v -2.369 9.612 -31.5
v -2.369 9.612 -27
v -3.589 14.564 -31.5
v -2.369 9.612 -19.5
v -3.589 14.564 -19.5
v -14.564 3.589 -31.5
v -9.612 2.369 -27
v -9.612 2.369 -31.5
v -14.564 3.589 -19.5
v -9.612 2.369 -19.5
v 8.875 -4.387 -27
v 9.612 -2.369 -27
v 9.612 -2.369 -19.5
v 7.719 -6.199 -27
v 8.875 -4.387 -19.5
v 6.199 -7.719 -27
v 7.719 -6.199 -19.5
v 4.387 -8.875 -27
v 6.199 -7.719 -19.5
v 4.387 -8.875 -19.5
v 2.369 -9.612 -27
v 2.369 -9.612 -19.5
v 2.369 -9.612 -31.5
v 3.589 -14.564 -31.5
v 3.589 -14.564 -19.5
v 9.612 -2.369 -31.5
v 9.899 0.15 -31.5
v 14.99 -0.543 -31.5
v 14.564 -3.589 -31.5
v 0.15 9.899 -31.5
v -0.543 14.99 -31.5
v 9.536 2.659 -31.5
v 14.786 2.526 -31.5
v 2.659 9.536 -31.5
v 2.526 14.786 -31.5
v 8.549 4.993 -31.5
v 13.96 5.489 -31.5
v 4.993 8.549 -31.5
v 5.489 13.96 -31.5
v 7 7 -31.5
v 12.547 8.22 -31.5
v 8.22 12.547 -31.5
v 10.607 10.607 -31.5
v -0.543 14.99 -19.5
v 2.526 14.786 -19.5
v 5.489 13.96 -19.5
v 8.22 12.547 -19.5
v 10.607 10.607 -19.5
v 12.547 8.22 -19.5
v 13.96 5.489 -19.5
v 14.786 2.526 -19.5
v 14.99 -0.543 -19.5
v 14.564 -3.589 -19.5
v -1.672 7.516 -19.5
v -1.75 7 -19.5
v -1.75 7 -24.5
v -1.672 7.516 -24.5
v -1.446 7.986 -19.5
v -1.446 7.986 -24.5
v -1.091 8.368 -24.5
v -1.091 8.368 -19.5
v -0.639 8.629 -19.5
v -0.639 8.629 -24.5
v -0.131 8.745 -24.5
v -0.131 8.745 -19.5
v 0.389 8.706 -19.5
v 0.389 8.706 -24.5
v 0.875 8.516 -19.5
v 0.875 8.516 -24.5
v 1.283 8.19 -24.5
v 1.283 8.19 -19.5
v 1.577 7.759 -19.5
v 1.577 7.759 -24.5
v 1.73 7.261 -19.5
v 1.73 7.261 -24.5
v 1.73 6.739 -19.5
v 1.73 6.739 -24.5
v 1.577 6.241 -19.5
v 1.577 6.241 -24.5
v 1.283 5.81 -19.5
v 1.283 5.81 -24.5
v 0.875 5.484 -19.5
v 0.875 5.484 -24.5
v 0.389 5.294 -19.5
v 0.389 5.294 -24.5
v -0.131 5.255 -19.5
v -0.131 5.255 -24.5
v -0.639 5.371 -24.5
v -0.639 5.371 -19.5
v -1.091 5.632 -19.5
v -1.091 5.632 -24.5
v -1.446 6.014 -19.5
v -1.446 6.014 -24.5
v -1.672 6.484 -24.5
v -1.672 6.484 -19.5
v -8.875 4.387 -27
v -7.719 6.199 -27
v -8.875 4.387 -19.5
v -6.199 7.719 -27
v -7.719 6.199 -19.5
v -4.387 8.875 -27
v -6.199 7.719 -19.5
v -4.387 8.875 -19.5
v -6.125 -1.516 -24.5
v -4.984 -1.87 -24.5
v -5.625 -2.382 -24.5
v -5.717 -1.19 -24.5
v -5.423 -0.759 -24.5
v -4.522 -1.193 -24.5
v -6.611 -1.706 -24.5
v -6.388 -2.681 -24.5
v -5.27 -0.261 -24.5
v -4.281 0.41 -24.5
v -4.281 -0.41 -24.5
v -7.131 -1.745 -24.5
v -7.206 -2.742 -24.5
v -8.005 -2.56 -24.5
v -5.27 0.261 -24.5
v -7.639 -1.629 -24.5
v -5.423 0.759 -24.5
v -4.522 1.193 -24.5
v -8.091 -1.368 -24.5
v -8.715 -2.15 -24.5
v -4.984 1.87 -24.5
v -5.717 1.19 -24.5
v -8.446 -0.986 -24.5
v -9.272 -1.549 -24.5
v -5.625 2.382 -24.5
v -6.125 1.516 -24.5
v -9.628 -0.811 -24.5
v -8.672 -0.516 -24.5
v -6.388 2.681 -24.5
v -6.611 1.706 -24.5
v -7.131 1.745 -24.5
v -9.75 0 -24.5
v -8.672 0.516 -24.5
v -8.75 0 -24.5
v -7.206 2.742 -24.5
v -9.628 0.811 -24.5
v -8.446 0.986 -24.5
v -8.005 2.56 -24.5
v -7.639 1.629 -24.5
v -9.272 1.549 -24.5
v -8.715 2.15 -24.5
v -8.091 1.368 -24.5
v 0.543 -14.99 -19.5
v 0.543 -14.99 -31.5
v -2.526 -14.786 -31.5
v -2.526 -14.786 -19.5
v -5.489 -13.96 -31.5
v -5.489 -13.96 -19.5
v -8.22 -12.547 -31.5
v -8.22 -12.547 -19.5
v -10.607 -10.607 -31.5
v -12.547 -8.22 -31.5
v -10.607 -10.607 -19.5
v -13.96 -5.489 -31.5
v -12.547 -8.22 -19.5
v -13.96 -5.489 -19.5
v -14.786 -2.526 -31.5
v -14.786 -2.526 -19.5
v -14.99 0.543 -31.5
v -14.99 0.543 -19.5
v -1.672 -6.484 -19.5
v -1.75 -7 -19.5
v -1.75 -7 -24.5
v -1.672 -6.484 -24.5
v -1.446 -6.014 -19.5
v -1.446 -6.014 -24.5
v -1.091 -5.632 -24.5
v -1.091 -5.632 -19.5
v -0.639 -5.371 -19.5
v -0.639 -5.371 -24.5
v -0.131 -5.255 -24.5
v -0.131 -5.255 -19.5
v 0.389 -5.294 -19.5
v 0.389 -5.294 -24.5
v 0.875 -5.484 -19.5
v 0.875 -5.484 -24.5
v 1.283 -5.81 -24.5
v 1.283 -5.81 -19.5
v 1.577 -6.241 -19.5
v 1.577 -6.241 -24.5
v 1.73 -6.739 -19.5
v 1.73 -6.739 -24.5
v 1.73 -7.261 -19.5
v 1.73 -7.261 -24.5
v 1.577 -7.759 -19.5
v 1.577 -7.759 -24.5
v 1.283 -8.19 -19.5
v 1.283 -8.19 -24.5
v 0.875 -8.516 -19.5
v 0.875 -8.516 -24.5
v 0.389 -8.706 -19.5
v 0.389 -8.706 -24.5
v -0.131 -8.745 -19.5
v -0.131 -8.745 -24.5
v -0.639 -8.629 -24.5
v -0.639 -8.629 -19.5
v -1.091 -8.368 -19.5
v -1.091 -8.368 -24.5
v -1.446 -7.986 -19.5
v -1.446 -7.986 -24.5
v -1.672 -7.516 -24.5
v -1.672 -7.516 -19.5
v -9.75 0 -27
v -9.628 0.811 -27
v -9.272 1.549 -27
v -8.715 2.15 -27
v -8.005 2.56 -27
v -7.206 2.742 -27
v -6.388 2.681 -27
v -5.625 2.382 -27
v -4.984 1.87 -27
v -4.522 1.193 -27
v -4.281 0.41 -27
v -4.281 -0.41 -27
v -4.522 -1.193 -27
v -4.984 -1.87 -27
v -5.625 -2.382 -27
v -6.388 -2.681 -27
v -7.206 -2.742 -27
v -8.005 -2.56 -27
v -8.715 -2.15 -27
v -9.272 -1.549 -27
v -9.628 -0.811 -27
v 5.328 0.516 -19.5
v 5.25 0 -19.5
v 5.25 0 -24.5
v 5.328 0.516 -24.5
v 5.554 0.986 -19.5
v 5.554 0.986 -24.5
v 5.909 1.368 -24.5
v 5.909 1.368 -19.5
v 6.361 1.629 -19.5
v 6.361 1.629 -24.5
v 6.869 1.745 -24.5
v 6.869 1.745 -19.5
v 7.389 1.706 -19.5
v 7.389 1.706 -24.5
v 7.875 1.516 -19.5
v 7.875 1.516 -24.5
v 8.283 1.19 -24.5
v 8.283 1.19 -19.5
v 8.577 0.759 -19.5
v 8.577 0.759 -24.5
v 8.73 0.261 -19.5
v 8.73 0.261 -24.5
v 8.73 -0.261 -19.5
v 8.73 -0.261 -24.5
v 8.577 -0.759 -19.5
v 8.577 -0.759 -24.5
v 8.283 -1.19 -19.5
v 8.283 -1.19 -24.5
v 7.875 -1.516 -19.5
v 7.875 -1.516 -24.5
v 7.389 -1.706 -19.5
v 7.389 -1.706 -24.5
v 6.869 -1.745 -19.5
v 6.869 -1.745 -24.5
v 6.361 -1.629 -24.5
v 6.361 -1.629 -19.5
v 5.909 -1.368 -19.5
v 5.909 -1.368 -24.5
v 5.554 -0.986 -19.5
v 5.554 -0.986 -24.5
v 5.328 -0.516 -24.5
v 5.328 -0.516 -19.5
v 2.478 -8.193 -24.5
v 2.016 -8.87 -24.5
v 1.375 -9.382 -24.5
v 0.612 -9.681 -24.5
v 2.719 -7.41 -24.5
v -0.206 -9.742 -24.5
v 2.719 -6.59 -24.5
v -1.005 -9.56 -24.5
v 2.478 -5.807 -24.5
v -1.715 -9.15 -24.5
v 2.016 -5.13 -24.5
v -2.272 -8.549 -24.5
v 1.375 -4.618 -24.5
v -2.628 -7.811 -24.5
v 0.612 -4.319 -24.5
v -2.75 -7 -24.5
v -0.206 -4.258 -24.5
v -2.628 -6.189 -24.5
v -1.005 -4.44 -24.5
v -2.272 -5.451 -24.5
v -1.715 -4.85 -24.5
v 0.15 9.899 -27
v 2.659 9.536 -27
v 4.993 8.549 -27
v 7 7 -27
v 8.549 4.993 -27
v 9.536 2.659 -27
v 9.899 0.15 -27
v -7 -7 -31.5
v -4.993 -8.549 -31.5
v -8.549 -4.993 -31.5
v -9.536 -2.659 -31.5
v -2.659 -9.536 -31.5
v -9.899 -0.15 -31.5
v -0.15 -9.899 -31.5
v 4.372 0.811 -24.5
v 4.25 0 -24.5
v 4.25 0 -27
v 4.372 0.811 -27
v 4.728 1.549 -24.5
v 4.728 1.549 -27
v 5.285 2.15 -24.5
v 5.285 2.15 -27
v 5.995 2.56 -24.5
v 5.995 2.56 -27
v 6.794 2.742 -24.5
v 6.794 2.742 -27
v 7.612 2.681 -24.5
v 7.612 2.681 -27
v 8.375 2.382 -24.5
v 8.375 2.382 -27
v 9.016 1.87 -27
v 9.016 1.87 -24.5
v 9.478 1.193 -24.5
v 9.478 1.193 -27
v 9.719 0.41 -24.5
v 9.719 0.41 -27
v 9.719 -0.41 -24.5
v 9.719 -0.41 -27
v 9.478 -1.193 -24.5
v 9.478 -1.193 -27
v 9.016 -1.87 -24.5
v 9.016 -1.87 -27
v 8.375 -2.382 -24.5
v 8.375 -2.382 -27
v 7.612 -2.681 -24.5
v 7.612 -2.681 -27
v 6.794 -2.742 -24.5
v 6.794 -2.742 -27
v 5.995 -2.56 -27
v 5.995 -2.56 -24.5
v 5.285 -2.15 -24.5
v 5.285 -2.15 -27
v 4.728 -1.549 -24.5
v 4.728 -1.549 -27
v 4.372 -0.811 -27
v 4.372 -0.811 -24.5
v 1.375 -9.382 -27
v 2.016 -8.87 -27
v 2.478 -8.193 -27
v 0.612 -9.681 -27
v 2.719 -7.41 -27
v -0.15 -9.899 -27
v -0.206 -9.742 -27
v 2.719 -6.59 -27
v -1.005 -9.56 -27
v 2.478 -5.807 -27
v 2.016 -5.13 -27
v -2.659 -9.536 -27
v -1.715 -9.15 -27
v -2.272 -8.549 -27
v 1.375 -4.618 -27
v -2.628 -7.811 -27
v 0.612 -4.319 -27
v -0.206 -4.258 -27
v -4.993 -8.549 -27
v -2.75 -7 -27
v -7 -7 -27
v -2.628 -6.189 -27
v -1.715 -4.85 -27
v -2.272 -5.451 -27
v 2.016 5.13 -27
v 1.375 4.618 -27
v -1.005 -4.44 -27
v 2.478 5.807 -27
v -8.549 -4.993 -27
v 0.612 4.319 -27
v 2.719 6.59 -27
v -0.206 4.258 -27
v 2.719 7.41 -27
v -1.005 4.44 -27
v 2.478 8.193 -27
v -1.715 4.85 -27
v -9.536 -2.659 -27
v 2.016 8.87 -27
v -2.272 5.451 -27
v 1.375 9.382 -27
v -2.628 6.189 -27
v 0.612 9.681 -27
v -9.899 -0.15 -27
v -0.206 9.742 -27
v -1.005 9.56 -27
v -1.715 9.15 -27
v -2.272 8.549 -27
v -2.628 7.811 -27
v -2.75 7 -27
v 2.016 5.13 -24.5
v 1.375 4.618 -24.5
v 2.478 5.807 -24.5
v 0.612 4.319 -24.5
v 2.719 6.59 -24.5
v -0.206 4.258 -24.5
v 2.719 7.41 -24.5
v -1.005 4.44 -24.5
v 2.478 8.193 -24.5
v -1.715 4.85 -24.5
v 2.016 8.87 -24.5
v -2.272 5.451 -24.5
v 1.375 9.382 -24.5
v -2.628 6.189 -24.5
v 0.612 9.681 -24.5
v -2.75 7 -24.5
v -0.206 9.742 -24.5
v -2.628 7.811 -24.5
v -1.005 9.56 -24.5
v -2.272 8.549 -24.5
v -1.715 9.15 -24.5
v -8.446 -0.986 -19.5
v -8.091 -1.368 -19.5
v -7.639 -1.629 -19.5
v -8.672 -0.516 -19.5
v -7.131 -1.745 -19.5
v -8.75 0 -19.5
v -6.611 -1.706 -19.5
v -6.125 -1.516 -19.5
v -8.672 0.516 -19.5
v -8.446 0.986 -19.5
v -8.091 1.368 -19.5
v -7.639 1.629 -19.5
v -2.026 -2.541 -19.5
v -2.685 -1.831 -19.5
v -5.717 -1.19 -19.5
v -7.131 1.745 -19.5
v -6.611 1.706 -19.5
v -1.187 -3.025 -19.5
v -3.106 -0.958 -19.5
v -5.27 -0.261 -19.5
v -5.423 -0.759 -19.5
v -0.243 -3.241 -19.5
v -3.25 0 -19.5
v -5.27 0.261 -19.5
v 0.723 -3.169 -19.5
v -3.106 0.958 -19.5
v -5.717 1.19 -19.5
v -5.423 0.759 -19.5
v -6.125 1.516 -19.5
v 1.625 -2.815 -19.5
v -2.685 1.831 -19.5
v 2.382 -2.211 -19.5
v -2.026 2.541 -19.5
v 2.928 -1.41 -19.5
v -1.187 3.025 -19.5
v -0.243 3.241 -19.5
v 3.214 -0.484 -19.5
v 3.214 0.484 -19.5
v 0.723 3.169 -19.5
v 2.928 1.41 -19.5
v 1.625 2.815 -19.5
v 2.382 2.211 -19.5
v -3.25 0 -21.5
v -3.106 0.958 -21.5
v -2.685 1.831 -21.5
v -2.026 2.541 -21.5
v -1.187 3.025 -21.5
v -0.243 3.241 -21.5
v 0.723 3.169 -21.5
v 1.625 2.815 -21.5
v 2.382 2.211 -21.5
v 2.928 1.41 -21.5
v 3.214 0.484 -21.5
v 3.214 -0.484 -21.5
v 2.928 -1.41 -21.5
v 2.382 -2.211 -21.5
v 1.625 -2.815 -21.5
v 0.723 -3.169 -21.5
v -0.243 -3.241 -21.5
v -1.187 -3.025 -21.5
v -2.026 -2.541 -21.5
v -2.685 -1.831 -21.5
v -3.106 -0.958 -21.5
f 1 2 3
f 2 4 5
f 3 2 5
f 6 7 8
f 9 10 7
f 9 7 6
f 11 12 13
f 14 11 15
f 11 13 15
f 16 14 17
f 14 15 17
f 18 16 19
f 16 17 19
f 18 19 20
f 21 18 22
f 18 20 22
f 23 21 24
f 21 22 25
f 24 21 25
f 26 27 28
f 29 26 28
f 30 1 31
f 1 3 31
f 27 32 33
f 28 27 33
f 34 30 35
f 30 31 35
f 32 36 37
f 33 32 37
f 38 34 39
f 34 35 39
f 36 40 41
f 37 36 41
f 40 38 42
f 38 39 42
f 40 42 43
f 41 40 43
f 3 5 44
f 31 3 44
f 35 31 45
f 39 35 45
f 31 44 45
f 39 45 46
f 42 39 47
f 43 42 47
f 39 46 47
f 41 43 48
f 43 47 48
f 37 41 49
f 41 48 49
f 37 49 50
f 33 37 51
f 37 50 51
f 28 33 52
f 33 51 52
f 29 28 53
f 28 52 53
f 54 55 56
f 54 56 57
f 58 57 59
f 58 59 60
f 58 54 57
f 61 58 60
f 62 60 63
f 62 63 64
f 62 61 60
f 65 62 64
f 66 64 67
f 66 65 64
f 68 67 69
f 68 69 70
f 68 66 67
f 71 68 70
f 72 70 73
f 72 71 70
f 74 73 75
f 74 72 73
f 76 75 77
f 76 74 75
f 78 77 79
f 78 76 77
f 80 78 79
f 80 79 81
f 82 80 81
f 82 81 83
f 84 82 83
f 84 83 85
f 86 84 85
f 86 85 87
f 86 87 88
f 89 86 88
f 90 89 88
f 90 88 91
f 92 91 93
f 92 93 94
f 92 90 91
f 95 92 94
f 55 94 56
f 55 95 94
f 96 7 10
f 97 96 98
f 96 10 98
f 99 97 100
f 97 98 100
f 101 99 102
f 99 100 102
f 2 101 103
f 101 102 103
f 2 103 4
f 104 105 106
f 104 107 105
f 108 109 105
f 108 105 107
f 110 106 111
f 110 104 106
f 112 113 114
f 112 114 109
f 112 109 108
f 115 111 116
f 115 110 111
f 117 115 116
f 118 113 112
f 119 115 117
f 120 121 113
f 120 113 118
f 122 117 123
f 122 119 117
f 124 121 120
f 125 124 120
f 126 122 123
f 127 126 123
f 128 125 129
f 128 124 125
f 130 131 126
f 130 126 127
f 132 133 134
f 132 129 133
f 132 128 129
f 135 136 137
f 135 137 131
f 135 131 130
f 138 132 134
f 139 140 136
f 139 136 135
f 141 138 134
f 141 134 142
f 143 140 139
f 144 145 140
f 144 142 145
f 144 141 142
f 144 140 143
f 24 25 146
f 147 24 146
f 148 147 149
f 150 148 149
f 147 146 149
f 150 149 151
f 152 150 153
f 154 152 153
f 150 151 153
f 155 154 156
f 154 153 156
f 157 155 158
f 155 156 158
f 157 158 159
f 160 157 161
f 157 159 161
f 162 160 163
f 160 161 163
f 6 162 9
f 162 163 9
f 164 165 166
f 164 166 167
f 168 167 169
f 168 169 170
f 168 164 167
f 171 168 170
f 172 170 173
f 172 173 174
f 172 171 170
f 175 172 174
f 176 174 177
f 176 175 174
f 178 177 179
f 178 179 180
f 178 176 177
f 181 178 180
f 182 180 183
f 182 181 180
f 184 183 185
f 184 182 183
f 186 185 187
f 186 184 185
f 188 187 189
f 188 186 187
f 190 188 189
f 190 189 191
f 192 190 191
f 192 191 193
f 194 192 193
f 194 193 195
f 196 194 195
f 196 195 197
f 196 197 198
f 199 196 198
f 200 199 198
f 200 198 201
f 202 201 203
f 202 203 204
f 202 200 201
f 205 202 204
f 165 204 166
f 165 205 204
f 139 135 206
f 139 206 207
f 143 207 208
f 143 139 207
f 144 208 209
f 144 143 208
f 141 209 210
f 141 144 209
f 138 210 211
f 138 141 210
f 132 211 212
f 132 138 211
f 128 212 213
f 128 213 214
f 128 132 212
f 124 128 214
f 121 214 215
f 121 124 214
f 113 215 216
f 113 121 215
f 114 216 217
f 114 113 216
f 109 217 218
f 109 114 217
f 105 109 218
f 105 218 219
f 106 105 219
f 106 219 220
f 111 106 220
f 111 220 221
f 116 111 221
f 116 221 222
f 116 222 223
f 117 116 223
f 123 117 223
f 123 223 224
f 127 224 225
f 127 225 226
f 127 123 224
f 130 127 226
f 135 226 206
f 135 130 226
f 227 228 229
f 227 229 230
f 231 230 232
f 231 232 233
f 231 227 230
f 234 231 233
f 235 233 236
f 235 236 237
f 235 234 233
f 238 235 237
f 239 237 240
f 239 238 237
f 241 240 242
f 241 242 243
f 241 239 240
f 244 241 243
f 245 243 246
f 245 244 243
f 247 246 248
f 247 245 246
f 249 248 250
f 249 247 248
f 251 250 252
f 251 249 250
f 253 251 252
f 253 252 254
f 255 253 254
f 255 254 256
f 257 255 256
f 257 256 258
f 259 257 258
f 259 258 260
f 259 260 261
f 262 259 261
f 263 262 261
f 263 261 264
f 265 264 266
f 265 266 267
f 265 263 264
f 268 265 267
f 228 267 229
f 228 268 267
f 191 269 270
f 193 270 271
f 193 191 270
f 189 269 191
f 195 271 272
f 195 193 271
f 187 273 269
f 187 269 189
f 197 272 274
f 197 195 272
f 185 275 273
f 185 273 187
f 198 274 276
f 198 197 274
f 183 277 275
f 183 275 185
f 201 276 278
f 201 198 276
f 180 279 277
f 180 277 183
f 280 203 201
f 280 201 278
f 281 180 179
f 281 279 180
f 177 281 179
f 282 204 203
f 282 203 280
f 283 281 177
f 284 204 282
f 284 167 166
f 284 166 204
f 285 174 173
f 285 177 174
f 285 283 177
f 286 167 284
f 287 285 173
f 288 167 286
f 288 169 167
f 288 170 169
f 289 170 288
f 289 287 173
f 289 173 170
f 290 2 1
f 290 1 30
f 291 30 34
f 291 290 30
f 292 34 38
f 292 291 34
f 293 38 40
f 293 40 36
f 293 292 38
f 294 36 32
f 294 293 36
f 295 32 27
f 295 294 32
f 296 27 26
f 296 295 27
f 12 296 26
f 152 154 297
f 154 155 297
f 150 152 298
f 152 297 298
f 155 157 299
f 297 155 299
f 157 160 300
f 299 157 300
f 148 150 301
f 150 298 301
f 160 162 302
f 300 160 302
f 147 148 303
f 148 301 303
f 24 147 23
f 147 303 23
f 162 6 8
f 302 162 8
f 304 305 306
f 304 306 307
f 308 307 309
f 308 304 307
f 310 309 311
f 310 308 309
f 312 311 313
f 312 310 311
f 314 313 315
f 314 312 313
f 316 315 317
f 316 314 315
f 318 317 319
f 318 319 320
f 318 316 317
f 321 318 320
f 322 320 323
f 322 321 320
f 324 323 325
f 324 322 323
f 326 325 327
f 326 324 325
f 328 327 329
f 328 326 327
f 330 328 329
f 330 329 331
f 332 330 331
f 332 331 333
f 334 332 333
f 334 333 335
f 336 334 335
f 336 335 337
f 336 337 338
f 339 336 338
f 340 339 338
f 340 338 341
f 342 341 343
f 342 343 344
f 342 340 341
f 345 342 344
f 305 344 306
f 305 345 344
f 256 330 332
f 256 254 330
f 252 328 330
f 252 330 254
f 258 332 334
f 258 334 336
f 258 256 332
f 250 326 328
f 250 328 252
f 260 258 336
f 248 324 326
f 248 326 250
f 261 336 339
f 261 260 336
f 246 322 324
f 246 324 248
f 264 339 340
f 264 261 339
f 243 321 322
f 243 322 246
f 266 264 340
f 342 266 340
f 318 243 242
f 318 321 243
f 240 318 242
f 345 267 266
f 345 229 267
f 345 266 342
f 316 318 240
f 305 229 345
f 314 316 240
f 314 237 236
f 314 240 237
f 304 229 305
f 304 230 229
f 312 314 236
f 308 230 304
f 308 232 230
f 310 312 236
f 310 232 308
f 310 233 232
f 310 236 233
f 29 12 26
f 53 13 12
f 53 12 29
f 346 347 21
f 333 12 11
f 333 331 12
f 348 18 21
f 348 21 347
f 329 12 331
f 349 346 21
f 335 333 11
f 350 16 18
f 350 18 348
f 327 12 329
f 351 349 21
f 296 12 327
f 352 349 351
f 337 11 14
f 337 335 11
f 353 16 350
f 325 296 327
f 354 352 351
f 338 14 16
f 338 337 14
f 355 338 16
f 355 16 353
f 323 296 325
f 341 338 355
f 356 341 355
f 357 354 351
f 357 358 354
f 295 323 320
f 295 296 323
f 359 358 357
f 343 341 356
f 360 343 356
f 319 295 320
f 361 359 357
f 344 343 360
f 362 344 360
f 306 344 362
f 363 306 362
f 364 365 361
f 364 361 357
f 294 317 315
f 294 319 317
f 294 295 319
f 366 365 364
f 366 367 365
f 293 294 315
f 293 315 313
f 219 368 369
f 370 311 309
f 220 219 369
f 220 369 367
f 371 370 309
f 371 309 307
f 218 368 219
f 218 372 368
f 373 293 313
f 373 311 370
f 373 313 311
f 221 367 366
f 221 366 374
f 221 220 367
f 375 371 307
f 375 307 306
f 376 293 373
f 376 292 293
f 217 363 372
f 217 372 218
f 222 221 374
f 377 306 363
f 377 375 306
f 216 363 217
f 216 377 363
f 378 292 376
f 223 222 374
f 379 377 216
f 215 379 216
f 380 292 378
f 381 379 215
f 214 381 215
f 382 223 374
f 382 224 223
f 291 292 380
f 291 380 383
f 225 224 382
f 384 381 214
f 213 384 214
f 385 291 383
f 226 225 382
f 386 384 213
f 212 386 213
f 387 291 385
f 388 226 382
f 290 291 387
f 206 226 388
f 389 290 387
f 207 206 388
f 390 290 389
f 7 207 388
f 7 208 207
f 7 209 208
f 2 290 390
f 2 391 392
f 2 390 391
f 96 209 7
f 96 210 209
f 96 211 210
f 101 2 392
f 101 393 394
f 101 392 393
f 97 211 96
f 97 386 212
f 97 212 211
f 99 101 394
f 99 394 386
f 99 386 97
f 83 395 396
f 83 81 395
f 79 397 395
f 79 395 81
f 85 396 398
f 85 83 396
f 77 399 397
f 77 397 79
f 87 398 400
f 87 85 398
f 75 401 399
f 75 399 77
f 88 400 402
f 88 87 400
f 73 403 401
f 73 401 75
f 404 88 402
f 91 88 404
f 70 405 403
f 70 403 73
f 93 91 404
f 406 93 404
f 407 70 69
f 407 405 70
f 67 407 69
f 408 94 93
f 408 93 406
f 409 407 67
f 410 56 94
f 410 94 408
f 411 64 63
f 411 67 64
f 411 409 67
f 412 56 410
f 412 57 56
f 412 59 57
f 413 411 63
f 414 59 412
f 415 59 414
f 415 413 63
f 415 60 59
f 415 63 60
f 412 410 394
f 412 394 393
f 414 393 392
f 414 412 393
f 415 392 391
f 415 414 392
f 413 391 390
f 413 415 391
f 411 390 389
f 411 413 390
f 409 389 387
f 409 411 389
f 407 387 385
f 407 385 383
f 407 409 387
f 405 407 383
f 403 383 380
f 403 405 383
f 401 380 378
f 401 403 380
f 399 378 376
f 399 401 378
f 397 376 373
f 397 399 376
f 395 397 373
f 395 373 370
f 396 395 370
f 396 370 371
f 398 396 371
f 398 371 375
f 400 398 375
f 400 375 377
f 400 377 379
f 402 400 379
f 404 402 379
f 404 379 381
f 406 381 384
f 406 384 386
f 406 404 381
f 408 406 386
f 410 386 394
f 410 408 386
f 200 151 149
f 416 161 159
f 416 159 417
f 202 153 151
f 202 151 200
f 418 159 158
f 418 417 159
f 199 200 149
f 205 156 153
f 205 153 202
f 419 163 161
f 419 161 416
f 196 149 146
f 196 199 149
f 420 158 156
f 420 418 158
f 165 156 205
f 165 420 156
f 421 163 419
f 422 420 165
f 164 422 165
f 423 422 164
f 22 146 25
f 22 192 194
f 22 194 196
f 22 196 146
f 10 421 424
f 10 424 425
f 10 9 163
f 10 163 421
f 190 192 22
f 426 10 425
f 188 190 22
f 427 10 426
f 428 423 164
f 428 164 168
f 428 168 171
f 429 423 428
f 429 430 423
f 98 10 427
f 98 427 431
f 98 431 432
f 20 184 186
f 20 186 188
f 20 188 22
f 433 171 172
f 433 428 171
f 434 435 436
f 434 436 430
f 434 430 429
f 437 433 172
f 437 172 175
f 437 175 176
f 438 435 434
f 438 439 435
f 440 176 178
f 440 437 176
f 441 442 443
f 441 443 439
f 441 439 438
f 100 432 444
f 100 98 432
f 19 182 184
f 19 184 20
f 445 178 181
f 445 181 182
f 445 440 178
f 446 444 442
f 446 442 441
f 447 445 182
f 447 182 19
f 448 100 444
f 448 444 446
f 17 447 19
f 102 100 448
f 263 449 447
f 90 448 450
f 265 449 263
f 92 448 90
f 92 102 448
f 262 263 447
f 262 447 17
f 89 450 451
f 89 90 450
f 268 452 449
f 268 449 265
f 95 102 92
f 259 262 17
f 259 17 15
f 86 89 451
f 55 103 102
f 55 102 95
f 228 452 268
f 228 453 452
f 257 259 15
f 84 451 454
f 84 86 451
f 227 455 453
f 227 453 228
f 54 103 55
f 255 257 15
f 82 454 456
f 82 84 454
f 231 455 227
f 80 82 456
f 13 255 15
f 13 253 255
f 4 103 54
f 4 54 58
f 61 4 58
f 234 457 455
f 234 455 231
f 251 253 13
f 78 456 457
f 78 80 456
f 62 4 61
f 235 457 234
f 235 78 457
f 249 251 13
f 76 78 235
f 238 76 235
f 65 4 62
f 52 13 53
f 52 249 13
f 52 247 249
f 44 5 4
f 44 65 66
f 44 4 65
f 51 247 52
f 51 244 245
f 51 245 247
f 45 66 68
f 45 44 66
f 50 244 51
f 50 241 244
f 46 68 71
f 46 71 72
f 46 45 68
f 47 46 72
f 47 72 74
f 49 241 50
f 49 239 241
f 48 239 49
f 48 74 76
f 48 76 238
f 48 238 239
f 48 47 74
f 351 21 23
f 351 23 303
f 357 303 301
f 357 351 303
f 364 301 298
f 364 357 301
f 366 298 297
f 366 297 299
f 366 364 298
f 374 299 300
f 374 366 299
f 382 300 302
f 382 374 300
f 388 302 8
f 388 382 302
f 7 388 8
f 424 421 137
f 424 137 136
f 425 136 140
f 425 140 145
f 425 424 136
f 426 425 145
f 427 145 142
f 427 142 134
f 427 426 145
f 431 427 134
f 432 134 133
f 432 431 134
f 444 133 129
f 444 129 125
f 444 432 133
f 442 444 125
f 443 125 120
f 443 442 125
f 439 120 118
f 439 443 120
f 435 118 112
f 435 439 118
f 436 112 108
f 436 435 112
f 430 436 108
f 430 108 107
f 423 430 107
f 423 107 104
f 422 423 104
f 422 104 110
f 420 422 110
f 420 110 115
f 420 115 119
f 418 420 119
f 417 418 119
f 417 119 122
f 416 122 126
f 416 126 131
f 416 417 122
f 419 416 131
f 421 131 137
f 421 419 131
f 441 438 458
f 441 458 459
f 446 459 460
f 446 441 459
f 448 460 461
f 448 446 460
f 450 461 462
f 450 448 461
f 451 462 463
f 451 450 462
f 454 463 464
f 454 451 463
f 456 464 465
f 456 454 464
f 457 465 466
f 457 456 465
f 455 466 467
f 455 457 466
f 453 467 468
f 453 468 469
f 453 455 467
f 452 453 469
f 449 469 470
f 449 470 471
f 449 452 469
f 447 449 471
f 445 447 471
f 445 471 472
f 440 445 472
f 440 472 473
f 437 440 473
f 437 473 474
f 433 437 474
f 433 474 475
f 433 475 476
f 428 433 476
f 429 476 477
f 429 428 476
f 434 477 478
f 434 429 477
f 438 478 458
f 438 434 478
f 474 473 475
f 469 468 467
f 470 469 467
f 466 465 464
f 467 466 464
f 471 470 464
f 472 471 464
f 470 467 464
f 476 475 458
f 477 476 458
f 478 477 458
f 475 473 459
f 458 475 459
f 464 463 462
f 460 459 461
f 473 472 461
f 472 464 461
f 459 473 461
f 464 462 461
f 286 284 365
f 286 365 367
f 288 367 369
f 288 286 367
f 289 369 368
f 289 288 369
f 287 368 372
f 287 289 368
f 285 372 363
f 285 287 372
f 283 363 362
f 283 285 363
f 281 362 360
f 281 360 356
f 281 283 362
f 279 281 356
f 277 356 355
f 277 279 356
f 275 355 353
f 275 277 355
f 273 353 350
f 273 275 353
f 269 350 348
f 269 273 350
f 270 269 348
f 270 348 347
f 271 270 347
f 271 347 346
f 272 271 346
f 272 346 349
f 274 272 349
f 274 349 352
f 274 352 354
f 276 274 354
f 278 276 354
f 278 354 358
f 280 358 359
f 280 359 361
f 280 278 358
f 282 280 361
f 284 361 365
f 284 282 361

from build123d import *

# Parameters (mm, degrees)
SKETCH012_R     = 9.9
SKETCH012_R_2   = 1.75
PAD009_DEPTH    = 5
SKETCH013_R     = 9.9
SKETCH013_R_2   = 2.75
PAD010_DEPTH    = 2.5
SKETCH014_R     = 3.25
POCKET002_DEPTH = 2
PAD011_DEPTH    = 12


with BuildPart() as part:
    # Sketch012 (on DatumPlane) → Pad009 (new body)
    with BuildSketch(Plane(origin=(0, 0, -19.5), x_dir=(-1, 0, 0), z_dir=(0, 0, -1))):
        Circle(SKETCH012_R)
        with Locations((0, 7)):
            Circle(SKETCH012_R_2, mode=Mode.SUBTRACT)
        with Locations((7, 0)):
            Circle(SKETCH012_R_2, mode=Mode.SUBTRACT)
        with Locations((0, -7)):
            Circle(SKETCH012_R_2, mode=Mode.SUBTRACT)
        with Locations((-7, 0)):
            Circle(SKETCH012_R_2, mode=Mode.SUBTRACT)
    extrude(amount=PAD009_DEPTH)

    # Sketch013 (on Face7 of Pad009) → Pad010 (join)
    with BuildSketch(Plane(origin=(0, 0, -24.5), x_dir=(-1, 0, 0), z_dir=(0, 0, -1))):
        Circle(SKETCH013_R)
        with Locations((0, 7)):
            Circle(SKETCH013_R_2, mode=Mode.SUBTRACT)
        with Locations((7, 0)):
            Circle(SKETCH013_R_2, mode=Mode.SUBTRACT)
        with Locations((0, -7)):
            Circle(SKETCH013_R_2, mode=Mode.SUBTRACT)
        with Locations((-7, 0)):
            Circle(SKETCH013_R_2, mode=Mode.SUBTRACT)
    extrude(amount=PAD010_DEPTH)

    # Sketch014 (on DatumPlane) → Pocket002 (cut)
    with BuildSketch(Plane(origin=(0, 0, -19.5), x_dir=(-1, 0, 0), z_dir=(0, 0, -1))):
        Circle(SKETCH014_R)
    extrude(amount=POCKET002_DEPTH, mode=Mode.SUBTRACT)

    # Sketch015 (on DatumPlane) → Pad011 (join)
    with BuildSketch(Plane(origin=(0, 0, -19.5), x_dir=(-1, 0, 0), z_dir=(0, 0, -1))):
        with BuildLine():
            ThreePointArc((2.3686, 9.612478), (-7.000357, 7.000357), (-9.612478, -2.3686))
            Line((-9.612478, -2.3686), (-14.56436, -3.588789))
            ThreePointArc((3.588789, 14.56436), (-10.606602, 10.606602), (-14.56436, -3.588789))
            Line((2.3686, 9.612478), (3.588789, 14.56436))
        make_face()
        with BuildLine():
            Line((9.612478, 2.3686), (14.56436, 3.588789))
            ThreePointArc((-3.588789, -14.56436), (10.606602, -10.606602), (14.56436, 3.588789))
            Line((-2.3686, -9.612478), (-3.588789, -14.56436))
            ThreePointArc((-2.3686, -9.612478), (7.000357, -7.000357), (9.612478, 2.3686))
        make_face()
    extrude(amount=PAD011_DEPTH)


solid = part.part
